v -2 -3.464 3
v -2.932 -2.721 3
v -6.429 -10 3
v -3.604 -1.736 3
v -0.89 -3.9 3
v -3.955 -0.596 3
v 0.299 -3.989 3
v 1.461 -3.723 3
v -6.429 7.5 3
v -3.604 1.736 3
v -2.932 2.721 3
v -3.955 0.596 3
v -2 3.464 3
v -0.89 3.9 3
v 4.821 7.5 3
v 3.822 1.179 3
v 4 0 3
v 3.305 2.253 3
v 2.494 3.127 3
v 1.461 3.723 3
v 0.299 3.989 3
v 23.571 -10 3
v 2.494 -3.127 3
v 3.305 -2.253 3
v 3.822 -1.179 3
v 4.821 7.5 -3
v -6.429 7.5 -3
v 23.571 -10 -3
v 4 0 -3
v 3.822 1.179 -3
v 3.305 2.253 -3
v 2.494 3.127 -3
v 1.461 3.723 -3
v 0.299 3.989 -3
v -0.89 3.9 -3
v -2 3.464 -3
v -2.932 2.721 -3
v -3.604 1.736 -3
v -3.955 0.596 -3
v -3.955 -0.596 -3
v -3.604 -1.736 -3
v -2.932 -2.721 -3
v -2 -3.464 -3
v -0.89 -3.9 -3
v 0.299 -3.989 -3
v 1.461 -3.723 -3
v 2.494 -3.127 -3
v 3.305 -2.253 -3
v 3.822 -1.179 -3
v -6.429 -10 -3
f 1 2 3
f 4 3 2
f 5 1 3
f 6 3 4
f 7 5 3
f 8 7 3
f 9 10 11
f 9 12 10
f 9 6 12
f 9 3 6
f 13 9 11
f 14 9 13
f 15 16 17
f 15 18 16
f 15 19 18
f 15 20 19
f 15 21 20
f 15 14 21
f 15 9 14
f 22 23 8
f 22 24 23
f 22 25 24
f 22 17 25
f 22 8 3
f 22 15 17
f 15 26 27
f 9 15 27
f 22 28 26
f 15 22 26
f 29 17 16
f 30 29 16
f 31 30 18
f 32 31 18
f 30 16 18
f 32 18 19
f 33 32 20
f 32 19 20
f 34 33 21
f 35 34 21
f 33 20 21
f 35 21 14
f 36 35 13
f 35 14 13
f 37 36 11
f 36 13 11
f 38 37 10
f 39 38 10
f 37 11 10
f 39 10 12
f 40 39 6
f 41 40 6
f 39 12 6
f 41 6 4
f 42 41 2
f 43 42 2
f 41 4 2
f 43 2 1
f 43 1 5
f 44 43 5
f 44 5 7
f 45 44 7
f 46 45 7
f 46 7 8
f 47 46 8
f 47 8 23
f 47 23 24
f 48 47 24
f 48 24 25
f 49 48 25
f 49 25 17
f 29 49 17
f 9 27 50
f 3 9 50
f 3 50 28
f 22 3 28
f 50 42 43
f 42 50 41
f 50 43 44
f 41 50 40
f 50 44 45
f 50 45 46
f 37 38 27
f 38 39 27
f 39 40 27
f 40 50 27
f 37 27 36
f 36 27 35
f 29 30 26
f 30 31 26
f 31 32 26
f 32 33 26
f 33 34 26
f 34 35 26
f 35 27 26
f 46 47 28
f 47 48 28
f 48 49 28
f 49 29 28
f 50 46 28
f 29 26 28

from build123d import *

# Parameters (mm, degrees)
BOSS_EXTRUDE1_DEPTH      = 3
BOSS_EXTRUDE1_DEPTH_BACK = 3
SKETCH2_R                = 4
CUT_EXTRUDE1_DEPTH       = 10


with BuildPart() as part:
    # Sketch1 → Boss-Extrude1 (new, two sides: drawn at the far end of the back side and taken through both)
    with BuildSketch(Plane.XY.offset(-BOSS_EXTRUDE1_DEPTH_BACK)):
        Polygon((8.571428571, -10), (23.571428571, -10), (4.821428571, 7.5), (-6.428571429, 7.5), (-6.428571429, -10), align=None)
    extrude(amount=BOSS_EXTRUDE1_DEPTH + BOSS_EXTRUDE1_DEPTH_BACK)

    # Sketch2 → Cut-Extrude1 (cut)
    with BuildSketch(Plane.XY.offset(3)):
        Circle(SKETCH2_R)
    extrude(amount=-CUT_EXTRUDE1_DEPTH, mode=Mode.SUBTRACT)


solid = part.part
